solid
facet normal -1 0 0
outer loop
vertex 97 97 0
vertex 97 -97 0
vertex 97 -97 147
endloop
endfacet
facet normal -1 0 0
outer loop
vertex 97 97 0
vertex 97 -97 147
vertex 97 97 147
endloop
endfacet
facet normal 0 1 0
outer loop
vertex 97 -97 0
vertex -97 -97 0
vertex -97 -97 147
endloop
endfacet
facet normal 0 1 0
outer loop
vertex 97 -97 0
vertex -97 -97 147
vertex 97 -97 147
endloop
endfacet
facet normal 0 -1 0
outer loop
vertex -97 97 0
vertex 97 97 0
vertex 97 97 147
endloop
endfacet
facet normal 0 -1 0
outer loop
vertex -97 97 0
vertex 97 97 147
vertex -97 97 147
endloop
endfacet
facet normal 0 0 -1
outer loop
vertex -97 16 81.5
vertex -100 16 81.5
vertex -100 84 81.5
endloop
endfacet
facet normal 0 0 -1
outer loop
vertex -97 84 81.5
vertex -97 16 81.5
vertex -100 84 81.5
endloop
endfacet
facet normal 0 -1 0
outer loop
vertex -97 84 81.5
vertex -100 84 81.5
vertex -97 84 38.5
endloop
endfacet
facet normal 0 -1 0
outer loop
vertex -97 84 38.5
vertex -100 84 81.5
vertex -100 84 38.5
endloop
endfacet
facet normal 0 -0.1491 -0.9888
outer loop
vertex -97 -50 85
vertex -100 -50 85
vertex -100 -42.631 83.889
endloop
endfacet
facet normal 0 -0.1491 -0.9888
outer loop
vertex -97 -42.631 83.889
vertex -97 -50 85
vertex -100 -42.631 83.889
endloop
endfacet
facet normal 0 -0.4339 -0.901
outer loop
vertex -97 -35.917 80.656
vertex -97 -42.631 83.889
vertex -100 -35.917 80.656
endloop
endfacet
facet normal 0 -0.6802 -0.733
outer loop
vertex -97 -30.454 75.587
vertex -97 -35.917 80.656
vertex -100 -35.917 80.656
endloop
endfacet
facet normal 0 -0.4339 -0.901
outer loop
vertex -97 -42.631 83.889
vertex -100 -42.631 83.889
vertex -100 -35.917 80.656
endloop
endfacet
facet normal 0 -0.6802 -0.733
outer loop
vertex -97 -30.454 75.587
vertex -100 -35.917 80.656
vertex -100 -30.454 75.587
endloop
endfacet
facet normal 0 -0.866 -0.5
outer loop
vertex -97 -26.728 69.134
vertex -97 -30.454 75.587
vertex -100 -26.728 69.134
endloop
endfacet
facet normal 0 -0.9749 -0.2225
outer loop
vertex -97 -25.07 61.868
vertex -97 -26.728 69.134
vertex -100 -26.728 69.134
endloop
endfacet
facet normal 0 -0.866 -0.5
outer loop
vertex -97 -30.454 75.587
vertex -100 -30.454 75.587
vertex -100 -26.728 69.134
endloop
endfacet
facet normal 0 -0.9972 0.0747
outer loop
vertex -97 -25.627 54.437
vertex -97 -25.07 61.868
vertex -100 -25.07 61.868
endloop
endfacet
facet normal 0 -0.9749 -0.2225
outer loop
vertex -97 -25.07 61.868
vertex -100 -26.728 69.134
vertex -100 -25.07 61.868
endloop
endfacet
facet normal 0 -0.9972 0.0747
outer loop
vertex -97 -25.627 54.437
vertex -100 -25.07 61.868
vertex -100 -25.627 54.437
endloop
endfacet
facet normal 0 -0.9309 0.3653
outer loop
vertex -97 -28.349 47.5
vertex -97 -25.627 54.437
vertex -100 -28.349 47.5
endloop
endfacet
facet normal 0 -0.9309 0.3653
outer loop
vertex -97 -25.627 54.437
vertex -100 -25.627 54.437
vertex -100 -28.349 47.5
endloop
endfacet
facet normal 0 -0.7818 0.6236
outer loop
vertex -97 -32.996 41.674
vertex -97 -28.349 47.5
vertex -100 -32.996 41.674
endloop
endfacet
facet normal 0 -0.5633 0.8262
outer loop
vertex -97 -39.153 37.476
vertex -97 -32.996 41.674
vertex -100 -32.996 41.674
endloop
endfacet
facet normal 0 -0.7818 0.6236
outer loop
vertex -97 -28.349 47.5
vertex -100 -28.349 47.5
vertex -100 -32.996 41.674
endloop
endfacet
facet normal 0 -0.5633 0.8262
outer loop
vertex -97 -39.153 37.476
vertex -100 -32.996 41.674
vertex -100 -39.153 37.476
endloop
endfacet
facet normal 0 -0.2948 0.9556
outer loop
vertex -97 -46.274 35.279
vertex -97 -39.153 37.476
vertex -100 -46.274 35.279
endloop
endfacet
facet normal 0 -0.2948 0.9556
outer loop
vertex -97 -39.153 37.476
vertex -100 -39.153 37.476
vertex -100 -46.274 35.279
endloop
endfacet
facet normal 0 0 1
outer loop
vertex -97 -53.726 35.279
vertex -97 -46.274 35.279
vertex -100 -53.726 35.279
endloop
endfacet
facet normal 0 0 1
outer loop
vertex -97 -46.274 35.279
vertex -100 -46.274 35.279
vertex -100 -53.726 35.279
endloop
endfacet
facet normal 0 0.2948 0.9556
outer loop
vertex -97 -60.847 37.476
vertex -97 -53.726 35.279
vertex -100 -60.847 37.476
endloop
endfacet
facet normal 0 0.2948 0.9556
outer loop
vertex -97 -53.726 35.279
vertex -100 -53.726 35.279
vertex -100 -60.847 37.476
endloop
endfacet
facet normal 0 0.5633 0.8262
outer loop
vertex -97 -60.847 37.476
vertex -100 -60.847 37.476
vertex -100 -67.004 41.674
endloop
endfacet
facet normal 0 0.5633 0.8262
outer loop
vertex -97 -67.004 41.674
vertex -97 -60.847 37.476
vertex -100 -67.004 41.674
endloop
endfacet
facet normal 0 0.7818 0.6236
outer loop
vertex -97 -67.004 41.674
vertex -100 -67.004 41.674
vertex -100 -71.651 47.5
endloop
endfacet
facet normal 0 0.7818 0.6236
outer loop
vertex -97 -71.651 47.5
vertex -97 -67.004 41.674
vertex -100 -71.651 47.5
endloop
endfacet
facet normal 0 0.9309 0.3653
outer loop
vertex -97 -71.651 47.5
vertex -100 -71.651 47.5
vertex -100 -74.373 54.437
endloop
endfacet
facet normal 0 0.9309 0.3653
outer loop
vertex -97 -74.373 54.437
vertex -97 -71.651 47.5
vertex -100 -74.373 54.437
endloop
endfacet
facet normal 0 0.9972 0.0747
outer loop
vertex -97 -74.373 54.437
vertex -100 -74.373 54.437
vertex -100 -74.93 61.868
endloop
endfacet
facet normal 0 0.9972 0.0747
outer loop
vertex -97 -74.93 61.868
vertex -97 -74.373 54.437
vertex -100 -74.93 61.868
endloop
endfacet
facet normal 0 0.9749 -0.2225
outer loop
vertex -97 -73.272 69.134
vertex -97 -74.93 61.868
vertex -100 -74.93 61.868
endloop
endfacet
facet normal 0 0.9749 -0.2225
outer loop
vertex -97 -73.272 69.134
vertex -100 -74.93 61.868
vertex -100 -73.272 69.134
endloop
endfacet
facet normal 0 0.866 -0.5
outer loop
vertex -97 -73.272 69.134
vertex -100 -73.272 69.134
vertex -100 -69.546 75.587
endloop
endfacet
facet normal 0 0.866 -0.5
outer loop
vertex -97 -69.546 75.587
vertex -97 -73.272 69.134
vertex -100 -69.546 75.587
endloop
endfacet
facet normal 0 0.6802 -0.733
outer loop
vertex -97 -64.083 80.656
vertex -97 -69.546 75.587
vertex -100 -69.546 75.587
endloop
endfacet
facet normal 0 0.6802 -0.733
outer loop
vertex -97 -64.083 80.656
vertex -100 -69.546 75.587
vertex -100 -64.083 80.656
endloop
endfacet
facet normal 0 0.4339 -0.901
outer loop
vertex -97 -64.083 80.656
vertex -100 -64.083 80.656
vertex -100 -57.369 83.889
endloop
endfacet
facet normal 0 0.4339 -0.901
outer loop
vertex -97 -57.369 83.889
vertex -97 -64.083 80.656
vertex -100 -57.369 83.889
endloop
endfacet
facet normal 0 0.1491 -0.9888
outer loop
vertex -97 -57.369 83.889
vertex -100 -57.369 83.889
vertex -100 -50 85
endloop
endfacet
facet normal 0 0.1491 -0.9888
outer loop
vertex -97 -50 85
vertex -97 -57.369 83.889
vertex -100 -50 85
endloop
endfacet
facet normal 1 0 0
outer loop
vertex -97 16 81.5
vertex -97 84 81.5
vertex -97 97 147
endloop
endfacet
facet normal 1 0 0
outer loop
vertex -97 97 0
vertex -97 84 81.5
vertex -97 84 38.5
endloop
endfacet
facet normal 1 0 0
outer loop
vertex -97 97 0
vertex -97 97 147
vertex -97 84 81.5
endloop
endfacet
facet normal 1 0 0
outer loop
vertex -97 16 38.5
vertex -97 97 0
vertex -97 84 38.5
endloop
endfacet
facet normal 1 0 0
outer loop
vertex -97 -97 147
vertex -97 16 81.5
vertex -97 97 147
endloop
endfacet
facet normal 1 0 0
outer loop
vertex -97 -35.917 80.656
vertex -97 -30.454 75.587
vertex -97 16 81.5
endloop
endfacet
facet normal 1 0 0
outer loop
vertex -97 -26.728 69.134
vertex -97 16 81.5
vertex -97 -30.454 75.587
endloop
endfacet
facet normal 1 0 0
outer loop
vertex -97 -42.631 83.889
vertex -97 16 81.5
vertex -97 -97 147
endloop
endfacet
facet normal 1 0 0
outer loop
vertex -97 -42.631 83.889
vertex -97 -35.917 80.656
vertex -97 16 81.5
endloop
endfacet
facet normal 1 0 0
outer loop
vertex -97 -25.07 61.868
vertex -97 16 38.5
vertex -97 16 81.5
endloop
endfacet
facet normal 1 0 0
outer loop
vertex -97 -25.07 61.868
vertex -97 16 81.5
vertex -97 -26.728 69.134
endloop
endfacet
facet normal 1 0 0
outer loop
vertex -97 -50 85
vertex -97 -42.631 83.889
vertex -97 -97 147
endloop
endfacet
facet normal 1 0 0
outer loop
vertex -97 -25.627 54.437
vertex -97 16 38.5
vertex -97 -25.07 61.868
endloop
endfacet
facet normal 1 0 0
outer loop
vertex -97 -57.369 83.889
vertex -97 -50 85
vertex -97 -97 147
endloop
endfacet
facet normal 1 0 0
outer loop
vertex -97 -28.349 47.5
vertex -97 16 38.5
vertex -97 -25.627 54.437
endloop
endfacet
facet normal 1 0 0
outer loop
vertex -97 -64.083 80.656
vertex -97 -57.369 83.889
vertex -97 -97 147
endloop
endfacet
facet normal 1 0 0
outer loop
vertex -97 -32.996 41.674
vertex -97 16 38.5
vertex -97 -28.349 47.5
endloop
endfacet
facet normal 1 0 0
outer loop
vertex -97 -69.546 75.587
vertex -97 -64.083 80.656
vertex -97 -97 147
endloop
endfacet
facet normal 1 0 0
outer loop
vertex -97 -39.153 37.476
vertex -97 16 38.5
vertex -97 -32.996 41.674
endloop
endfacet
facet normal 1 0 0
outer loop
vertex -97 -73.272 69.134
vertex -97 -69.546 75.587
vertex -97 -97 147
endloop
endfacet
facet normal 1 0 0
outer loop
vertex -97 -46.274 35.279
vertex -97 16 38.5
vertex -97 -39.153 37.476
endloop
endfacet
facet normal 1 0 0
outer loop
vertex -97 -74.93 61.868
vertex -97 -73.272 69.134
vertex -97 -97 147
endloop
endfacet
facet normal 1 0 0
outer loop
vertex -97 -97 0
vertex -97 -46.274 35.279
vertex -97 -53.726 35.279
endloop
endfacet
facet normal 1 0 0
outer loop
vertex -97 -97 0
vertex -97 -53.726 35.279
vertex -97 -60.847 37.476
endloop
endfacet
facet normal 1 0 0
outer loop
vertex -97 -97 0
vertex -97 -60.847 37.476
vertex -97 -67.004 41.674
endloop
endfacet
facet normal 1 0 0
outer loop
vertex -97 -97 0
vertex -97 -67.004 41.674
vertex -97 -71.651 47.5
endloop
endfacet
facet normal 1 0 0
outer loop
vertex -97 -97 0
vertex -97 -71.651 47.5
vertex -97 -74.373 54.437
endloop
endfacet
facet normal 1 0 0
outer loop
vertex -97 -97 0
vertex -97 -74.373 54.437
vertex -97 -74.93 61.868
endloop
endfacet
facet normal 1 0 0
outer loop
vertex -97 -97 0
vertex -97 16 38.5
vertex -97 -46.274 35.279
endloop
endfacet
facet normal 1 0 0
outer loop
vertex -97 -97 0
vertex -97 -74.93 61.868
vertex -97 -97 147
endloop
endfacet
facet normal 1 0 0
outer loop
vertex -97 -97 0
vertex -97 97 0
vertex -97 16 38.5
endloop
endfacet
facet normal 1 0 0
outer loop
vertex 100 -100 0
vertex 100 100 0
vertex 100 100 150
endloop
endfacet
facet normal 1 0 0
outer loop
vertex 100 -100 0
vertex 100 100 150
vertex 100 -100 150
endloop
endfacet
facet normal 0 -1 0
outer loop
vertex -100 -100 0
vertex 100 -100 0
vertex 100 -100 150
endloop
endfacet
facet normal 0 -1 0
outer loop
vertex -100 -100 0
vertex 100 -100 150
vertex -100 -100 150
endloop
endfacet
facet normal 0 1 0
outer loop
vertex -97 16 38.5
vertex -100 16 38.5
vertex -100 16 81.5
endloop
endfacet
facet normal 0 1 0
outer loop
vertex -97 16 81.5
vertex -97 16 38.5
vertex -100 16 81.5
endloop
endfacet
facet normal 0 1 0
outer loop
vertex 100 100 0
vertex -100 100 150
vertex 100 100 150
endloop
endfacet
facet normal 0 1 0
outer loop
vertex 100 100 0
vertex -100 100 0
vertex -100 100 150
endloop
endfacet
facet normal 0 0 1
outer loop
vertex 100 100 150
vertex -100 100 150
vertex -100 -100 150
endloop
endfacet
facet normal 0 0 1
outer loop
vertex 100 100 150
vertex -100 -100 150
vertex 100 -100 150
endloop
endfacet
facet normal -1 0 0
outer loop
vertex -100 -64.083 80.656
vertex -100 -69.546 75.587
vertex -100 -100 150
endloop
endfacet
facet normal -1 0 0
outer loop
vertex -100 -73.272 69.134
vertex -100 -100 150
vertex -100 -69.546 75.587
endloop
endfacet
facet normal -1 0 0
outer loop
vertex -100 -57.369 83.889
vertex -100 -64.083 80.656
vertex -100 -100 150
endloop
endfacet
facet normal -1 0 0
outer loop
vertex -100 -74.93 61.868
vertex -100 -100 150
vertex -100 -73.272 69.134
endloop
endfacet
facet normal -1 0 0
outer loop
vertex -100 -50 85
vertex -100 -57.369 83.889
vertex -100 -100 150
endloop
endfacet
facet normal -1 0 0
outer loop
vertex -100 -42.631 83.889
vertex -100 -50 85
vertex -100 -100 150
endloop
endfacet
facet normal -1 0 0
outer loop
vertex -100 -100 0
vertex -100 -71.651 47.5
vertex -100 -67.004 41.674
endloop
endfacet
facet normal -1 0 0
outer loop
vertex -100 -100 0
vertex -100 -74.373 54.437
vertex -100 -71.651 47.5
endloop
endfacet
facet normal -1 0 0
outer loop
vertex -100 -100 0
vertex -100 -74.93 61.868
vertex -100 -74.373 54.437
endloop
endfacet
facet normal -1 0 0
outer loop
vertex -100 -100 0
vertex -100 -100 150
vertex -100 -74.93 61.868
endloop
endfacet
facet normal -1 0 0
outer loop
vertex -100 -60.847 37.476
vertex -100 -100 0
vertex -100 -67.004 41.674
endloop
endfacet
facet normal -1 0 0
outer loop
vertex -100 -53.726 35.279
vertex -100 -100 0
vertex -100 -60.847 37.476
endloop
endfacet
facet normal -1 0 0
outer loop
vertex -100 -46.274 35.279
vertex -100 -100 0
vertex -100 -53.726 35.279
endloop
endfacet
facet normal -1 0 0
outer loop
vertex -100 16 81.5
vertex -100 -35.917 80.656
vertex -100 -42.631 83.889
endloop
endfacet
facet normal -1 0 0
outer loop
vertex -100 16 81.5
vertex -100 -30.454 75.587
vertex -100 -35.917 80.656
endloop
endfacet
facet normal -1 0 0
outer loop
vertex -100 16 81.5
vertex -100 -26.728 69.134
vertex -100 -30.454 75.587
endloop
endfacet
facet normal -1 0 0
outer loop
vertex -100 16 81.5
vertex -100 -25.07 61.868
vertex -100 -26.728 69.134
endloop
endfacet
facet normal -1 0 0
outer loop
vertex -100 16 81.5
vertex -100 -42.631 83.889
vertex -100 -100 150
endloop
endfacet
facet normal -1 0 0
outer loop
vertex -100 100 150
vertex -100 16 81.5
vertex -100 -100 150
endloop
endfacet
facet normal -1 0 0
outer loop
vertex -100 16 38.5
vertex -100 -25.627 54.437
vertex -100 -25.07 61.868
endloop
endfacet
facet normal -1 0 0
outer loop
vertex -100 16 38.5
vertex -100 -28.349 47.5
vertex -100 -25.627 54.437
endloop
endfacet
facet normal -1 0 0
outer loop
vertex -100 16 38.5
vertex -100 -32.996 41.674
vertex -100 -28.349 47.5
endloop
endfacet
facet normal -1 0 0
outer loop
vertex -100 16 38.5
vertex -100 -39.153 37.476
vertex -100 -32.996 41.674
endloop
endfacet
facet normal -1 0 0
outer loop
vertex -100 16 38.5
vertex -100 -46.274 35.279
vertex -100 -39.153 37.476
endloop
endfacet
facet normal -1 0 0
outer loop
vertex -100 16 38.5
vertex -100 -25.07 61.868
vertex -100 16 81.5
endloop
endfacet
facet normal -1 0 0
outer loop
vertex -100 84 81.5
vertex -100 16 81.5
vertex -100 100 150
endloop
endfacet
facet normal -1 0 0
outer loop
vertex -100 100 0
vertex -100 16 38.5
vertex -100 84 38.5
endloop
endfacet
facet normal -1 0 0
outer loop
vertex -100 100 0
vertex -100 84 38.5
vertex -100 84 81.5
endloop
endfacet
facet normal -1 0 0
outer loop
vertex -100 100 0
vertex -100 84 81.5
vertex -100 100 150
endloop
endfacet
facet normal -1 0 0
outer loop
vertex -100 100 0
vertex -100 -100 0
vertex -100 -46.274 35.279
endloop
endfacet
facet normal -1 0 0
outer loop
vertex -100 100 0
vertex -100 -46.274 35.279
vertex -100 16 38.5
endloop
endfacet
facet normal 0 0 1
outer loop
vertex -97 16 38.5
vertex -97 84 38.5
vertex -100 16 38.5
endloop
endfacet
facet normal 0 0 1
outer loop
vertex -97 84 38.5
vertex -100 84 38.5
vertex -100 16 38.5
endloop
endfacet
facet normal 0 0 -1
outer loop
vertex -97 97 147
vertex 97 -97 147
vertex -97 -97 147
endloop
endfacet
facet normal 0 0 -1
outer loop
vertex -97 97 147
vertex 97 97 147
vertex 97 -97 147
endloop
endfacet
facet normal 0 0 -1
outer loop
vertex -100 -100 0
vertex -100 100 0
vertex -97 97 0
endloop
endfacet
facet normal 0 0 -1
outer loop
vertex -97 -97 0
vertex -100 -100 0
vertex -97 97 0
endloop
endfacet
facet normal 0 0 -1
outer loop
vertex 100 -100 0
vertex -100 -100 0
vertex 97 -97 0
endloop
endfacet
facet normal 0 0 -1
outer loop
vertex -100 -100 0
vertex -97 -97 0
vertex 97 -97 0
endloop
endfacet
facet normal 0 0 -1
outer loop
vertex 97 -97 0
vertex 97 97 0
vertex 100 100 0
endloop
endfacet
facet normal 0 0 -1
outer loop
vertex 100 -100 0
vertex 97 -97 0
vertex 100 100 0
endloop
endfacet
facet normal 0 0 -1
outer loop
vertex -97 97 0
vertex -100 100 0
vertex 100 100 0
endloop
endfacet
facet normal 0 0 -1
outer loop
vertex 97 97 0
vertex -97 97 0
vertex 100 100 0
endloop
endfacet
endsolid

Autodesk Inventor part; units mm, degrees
sketch "Sketch2" plane through (0, 0, 0) normal (0, 0, 1) x (1, 0, 0)
  line L0 (100, -100) -> (-100, -100)
  line L1 (-100, -100) -> (-100, 100)
  line L2 (-100, 100) -> (100, 100)
  line L3 (100, 100) -> (100, -100)
  line L4 (100, -100) -> (-100, 100) construction
  line L5 (-100, -100) -> (100, 100) construction
  point P0 (0, 0)
  dimension "d0" = 200
  dimension "d1" = 200
extrude "Extrusion1" add sketch "Sketch2" along normal blind 150
sketch "Sketch3" plane through (0, 0, 0) normal (0, 0, -1) x (-1, 0, 0)
  line L0 (-97, 97) -> (97, 97)
  line L1 (97, 97) -> (97, -97)
  line L2 (97, -97) -> (-97, -97)
  line L3 (-97, -97) -> (-97, 97)
  line L4 (-97, 97) -> (97, -97) construction
  line L5 (97, 97) -> (-97, -97) construction
  line L6 (-100, 100) -> (100, 100) construction
  line L7 (-100, -100) -> (-100, 100) construction
  line L8 (100, -100) -> (-100, -100) construction
  line L9 (100, 100) -> (100, -100) construction
  point P0 (0, 0)
  dimension "d4" = 3
  dimension "d5" = 3
extrude "Extrusion2" cut sketch "Sketch3" against normal blind 147
sketch "Sketch4" plane through (-100, -100, 0) normal (-1, 0, 0) x (0, 0, 1)
  line L0 (0, 200) -> (0, 0) construction
  line L1 (0, 0) -> (150, 0) construction
  line L2 (150, 200) -> (150, 0) construction
  line L3 (0, 200) -> (150, 200) construction
  line L4 (38.5, 116) -> (81.5, 116)
  line L5 (81.5, 116) -> (81.5, 184)
  line L6 (81.5, 184) -> (38.5, 184)
  line L7 (38.5, 184) -> (38.5, 116)
  line L8 (38.5, 116) -> (81.5, 184) construction
  line L9 (81.5, 116) -> (38.5, 184) construction
  circle A0 centre (60, 50) radius 25
  line L10 (0, 200) -> (0, 0) construction
  point P0 (0, 100)
  point P1 (60, 150)
  dimension "d8" = 43
  dimension "d9" = 68
  dimension "d10" = 50
  dimension "d11" = 60
  dimension "d12" = 60
  dimension "d13" = 200
  dimension "d14" = 50
  dimension "d15" = 50
extrude "Extrusion3" cut sketch "Sketch4" against normal up to surface (3 mm away)
sketch "Sketch5" plane through (-100, -100, 0) normal (0, -1, 0) x (1, 0, 0)
  point P0 (100, 0)
sketch "Sketch6" plane through (0, 0, 0) normal (0, 0, -1) x (-1, 0, 0)
  line L0 (97, 97) -> (97, -97) construction
  line L1 (97, -97) -> (-97, -97) construction
  line L2 (-97, -97) -> (-97, 97) construction
  line L3 (-97, 97) -> (97, 97) construction
  line L4 (-100, 100) -> (100, 100) construction
  line L5 (-100, -100) -> (-100, 100) construction
  line L6 (100, -100) -> (-100, -100) construction
  line L7 (100, 100) -> (100, -100) construction
  point P0 (0, 0)
equation "\"d14\" = 0.25 * d13"
equation "\"d15\" = 0.25 * d13"
properties part number "P022_Coque_boitier"
